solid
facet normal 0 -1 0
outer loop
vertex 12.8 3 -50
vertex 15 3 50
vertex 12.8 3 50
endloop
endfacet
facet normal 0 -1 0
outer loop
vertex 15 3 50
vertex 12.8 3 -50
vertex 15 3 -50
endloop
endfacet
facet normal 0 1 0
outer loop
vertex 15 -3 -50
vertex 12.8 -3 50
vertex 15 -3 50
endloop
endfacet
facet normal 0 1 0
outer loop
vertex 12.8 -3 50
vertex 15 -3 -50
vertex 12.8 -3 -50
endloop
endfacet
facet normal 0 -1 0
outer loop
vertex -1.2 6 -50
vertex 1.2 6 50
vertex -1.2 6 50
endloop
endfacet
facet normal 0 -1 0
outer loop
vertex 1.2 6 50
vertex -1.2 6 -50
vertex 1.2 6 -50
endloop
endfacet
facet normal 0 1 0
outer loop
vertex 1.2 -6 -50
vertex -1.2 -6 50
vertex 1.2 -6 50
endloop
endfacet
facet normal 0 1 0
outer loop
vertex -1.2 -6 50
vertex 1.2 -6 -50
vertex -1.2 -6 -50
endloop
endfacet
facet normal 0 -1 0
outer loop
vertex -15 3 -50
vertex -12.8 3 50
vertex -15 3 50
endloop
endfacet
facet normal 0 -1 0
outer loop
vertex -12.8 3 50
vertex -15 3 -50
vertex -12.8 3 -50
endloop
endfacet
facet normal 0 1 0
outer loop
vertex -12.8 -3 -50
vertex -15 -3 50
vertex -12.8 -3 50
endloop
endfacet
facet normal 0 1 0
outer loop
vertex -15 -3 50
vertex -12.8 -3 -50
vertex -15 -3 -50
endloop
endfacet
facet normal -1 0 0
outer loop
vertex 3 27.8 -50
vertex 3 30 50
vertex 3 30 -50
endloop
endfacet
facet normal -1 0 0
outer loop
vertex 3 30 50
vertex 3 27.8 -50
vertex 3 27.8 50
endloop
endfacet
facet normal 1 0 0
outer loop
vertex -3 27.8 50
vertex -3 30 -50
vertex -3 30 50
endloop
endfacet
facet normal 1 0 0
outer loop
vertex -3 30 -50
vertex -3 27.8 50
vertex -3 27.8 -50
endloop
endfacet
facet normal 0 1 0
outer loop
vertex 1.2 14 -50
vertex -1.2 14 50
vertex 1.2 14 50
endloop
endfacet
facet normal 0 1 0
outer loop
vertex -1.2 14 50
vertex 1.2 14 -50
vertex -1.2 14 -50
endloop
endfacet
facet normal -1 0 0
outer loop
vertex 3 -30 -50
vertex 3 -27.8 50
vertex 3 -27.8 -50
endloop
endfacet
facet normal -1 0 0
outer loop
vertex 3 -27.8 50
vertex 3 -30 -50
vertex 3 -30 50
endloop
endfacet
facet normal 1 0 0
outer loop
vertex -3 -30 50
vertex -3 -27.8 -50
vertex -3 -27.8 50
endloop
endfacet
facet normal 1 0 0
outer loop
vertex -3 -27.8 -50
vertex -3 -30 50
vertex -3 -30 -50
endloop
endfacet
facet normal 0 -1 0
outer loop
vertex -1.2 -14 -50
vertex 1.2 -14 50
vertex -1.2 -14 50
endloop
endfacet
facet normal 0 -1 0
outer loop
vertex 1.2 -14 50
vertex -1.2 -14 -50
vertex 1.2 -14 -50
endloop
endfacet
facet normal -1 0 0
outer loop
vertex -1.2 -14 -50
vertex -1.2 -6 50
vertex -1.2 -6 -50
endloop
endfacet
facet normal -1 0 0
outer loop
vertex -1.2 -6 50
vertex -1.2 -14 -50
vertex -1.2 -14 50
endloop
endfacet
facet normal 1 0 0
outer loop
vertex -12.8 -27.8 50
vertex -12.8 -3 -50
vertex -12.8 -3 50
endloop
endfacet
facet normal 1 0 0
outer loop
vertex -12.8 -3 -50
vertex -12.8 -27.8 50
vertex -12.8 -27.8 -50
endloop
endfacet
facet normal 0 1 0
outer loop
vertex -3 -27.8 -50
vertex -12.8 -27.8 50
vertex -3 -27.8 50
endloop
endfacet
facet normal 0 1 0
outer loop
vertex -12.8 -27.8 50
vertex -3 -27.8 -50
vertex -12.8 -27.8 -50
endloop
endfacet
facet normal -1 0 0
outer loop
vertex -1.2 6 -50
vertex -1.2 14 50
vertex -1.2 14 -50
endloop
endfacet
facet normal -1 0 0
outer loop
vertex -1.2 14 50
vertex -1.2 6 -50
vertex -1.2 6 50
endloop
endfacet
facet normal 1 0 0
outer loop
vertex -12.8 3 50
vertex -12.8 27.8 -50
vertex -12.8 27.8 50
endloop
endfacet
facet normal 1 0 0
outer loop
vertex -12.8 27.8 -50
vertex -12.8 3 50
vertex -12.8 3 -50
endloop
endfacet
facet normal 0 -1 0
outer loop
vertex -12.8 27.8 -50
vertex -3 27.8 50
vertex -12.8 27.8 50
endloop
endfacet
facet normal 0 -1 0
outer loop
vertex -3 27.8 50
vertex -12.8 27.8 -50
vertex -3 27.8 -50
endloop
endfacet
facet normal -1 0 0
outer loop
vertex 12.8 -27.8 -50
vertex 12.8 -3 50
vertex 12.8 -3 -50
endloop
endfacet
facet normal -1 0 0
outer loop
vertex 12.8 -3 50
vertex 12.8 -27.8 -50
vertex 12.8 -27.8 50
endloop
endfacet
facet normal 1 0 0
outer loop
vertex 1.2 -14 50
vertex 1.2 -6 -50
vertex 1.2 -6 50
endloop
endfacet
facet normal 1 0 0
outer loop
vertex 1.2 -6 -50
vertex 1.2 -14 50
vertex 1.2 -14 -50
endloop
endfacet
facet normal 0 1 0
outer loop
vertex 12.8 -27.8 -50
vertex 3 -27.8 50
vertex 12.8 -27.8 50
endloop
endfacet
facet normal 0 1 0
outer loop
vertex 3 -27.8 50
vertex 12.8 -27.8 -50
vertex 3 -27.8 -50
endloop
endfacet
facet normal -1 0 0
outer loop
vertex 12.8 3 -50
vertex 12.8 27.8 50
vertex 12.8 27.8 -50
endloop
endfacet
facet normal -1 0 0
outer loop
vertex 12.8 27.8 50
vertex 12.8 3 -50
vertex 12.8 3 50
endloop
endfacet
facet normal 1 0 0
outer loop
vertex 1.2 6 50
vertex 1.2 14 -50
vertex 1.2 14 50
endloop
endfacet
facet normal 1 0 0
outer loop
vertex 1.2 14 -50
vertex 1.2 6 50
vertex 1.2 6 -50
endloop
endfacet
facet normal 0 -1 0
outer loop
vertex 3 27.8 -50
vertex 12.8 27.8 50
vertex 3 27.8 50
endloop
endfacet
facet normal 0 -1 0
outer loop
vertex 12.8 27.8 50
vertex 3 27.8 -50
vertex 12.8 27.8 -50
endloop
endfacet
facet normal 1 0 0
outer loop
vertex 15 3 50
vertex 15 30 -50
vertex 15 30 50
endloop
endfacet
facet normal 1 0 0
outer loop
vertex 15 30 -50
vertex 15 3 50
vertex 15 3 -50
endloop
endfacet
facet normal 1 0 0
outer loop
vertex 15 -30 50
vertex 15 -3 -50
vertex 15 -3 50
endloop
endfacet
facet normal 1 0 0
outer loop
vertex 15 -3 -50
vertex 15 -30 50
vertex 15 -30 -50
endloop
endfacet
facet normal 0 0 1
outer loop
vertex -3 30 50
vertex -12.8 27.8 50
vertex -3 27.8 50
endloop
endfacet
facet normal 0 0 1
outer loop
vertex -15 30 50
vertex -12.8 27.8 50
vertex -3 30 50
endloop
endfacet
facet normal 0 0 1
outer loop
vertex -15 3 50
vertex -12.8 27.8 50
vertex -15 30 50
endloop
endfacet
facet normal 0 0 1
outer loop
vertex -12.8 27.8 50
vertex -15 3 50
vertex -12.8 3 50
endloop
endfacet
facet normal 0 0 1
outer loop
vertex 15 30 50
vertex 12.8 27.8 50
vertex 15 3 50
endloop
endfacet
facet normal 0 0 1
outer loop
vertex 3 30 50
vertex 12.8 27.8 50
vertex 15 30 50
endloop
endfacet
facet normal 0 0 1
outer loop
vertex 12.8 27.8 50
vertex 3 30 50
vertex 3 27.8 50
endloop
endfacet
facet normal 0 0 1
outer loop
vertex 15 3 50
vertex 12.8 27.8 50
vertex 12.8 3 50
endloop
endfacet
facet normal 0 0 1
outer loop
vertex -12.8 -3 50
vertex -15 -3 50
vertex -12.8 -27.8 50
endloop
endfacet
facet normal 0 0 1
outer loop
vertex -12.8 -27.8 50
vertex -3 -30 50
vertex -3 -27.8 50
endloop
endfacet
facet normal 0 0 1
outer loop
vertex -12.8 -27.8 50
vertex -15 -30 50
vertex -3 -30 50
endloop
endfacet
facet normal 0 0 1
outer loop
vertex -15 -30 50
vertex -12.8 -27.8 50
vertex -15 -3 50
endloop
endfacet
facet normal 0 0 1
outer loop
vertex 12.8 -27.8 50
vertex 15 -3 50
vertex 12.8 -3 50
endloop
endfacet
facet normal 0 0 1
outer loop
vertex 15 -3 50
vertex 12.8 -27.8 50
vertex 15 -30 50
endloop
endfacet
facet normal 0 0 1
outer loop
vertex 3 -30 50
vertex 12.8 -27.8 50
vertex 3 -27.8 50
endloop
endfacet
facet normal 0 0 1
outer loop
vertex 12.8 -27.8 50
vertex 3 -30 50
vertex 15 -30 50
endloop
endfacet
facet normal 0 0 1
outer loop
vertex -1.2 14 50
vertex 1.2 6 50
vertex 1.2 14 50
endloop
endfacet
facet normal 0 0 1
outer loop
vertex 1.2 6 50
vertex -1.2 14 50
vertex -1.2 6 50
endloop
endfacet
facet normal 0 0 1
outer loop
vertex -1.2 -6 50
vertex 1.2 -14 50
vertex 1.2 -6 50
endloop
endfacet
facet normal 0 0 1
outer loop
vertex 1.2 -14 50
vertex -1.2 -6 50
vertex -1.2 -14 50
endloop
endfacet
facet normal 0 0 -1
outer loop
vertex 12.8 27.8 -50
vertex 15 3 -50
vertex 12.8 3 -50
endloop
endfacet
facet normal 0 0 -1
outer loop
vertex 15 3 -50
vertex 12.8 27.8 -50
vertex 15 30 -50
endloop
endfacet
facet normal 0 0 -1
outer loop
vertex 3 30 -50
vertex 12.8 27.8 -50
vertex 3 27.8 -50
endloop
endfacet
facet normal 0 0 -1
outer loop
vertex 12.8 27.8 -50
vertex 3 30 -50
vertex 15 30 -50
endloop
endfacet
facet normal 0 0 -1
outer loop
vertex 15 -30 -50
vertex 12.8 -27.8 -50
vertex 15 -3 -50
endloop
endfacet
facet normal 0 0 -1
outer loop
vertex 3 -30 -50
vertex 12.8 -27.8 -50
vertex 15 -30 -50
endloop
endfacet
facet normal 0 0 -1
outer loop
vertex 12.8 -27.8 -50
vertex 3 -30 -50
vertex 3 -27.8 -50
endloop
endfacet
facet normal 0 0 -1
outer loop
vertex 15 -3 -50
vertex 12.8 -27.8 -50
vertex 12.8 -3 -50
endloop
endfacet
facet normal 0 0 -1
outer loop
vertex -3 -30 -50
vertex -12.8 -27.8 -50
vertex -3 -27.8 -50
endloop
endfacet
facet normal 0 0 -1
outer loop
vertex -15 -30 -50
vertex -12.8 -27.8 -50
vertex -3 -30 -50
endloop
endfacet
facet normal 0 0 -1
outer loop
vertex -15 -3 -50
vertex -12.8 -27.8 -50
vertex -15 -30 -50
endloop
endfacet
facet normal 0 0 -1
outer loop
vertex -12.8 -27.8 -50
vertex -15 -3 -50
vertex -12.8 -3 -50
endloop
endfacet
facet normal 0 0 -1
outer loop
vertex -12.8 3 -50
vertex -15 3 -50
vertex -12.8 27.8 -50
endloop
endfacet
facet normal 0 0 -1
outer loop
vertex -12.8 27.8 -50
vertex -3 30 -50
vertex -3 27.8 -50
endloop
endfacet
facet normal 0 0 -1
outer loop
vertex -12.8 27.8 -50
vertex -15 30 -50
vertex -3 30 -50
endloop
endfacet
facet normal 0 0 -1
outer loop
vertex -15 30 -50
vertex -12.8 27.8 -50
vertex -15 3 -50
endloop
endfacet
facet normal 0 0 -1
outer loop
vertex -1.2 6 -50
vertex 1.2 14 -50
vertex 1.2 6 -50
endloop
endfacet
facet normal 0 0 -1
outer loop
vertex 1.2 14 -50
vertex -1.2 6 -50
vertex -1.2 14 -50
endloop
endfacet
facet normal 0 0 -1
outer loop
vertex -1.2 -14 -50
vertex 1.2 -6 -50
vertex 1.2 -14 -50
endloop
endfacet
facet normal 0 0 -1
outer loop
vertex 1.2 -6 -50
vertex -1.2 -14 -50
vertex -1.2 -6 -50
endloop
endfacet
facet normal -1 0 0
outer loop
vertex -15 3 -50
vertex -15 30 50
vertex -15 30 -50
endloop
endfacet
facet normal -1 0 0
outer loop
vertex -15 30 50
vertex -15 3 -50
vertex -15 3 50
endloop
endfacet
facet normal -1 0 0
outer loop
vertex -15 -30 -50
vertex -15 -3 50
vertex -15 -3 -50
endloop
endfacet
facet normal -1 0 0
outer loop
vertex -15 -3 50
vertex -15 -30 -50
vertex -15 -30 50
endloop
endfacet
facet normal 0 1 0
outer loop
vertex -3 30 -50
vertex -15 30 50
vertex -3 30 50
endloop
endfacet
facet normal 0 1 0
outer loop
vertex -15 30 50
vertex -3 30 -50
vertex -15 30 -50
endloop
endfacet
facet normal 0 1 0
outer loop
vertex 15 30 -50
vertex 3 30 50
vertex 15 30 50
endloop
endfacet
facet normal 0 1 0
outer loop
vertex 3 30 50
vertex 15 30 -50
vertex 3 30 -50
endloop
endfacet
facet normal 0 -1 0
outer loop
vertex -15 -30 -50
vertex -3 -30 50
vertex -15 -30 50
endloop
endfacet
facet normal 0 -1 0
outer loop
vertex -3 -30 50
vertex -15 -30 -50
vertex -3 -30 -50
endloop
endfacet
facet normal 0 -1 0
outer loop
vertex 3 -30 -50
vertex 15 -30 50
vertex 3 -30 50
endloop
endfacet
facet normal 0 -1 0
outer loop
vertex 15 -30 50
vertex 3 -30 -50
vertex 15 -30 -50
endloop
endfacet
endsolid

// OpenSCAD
// 30x60 aluminium extrusion profile, 100mm long
// One connected solid: outer body minus connected internal voids/slots/bores

$fn = 96;

// Parameters
cross_section_width_mm  = 30.0;   // X
cross_section_height_mm = 60.0;   // Y
length_mm               = 100.0;  // Z
center_along_length     = 1;      // 1=centered, 0=starts at Z=0

wall_thickness_mm       = 2.5;
slot_opening_mm         = 6.0;    // mouth width at surface
slot_depth_mm           = 8.0;    // depth from surface to inner cavity
slot_cavity_width_mm    = 12.0;   // inner cavity width
web_thickness_mm        = 3.0;

center_bore_diameter_mm = 8.0;

include_corner_holes    = 0;
corner_hole_diameter_mm = 5.0;
corner_hole_inset_mm    = 7.5;

overlap_mm              = 0.6;

// Helpers
function zshift() = (center_along_length ? 0 : length_mm/2);

// Clamp helper (avoid impossible geometry that can blank renders)
function clamp(v, lo, hi) = (v < lo) ? lo : ((v > hi) ? hi : v);

// Derived safe dimensions
W  = cross_section_width_mm;
H  = cross_section_height_mm;
L  = length_mm;

wt = clamp(wall_thickness_mm, 0.8, min(W,H)/4);
web = clamp(web_thickness_mm, 1.0, min(W,H)/3);

slot_mouth = clamp(slot_opening_mm, 2.0, min(W,H)/2 - 2*wt);
slot_cav   = clamp(slot_cavity_width_mm, slot_mouth, min(W,H) - 2*wt - 2);
slot_d     = clamp(slot_depth_mm, 2.0, min(W,H)/2 - wt - 1.0);

// T-slot cuts (each is a single connected cut volume per face)
module tslot_cut_x(side=1) { // side=+1 right, -1 left
    // Mouth block touches outer surface; cavity block overlaps mouth to ensure connectivity
    mouth_len = slot_d;
    cav_len   = slot_d;

    // Mouth: from surface inward
    translate([side*(W/2 - mouth_len/2), 0, 0])
        cube([mouth_len + overlap_mm, slot_mouth, L + 2*overlap_mm], center=true);

    // Cavity: behind mouth, overlapping by overlap_mm
    translate([side*(W/2 - mouth_len - cav_len/2 + overlap_mm/2), 0, 0])
        cube([cav_len + overlap_mm, slot_cav, L + 2*overlap_mm], center=true);
}

module tslot_cut_y(side=1) { // side=+1 top, -1 bottom
    mouth_len = slot_d;
    cav_len   = slot_d;

    translate([0, side*(H/2 - mouth_len/2), 0])
        cube([slot_mouth, mouth_len + overlap_mm, L + 2*overlap_mm], center=true);

    translate([0, side*(H/2 - mouth_len - cav_len/2 + overlap_mm/2), 0])
        cube([slot_cav, cav_len + overlap_mm, L + 2*overlap_mm], center=true);
}

module extrusion_3060() {
    difference() {
        // Outer solid (single body)
        cube([W, H, L], center=true);

        // All voids are subtracted from the same outer body (keeps one connected solid)
        union() {
            // T-slots on all 4 faces
            tslot_cut_x(+1);
            tslot_cut_x(-1);
            tslot_cut_y(+1);
            tslot_cut_y(-1);

            // Center bore
            cylinder(d=center_bore_diameter_mm, h=L + 2*overlap_mm, center=true);

            // Internal hollows: create a connected "ring" void that does NOT cut through outer walls.
            // This avoids splitting the extrusion into separate bars.
            inner_w = W - 2*wt;
            inner_h = H - 2*wt;

            // Ensure inner void stays valid and leaves webs
            inner_w2 = max(1.0, inner_w);
            inner_h2 = max(1.0, inner_h);

            // Central rectangular void (kept inside walls)
            cube([inner_w2, inner_h2, L + 2*overlap_mm], center=true);

            // Add back material via "negative cuts" is not possible in difference(),
            // so instead we *limit* the central void to preserve a "+" web by subtracting
            // two smaller voids that overlap the central void, leaving webs uncut.
            // Implemented by cutting only the four corner pockets (connected via small overlaps).

            // Corner pocket sizes (leave webs of thickness 'web')
            pocket_w = (inner_w2 - web) / 2;
            pocket_h = (inner_h2 - web) / 2;

            // If pockets would be invalid, skip them (still yields a valid extrusion)
            if (pocket_w > 0.5 && pocket_h > 0.5) {
                // Remove only corner pockets instead of full inner rectangle:
                // Achieve this by first "undoing" the full inner rectangle cut:
                // We avoid that by not cutting the full inner rectangle when pockets are used.
                // So: conditionally replace the full inner rectangle with corner pockets.
            }
        }
    }
}

// Rebuild extrusion_3060 with correct internal void strategy (no splitting)
module extrusion_3060_fixed() {
    inner_w = W - 2*wt;
    inner_h = H - 2*wt;

    pocket_w = (inner_w - web) / 2;
    pocket_h = (inner_h - web) / 2;

    difference() {
        cube([W, H, L], center=true);

        union() {
            // T-slots
            tslot_cut_x(+1);
            tslot_cut_x(-1);
            tslot_cut_y(+1);
            tslot_cut_y(-1);

            // Center bore
            cylinder(d=center_bore_diameter_mm, h=L + 2*overlap_mm, center=true);

            // Internal hollows: four corner pockets (leave a connected "+" web)
            if (pocket_w > 0.5 && pocket_h > 0.5) {
                for (sx = [-1, 1], sy = [-1, 1]) {
                    translate([sx*(web/2 + pocket_w/2), sy*(web/2 + pocket_h/2), 0])
                        cube([pocket_w + overlap_mm, pocket_h + overlap_mm, L + 2*overlap_mm], center=true);
                }
            } else {
                // Fallback: simple inner rectangle (still connected solid)
                cube([max(1.0, inner_w), max(1.0, inner_h), L + 2*overlap_mm], center=true);
            }

            // Optional corner holes
            if (include_corner_holes) {
                for (sx = [-1, 1], sy = [-1, 1]) {
                    translate([sx*(W/2 - corner_hole_inset_mm),
                               sy*(H/2 - corner_hole_inset_mm),
                               0])
                        cylinder(d=corner_hole_diameter_mm, h=L + 2*overlap_mm, center=true);
                }
            }
        }
    }
}

// Assembly (single solid)
translate([0, 0, zshift()])
    color("Silver") extrusion_3060_fixed();
